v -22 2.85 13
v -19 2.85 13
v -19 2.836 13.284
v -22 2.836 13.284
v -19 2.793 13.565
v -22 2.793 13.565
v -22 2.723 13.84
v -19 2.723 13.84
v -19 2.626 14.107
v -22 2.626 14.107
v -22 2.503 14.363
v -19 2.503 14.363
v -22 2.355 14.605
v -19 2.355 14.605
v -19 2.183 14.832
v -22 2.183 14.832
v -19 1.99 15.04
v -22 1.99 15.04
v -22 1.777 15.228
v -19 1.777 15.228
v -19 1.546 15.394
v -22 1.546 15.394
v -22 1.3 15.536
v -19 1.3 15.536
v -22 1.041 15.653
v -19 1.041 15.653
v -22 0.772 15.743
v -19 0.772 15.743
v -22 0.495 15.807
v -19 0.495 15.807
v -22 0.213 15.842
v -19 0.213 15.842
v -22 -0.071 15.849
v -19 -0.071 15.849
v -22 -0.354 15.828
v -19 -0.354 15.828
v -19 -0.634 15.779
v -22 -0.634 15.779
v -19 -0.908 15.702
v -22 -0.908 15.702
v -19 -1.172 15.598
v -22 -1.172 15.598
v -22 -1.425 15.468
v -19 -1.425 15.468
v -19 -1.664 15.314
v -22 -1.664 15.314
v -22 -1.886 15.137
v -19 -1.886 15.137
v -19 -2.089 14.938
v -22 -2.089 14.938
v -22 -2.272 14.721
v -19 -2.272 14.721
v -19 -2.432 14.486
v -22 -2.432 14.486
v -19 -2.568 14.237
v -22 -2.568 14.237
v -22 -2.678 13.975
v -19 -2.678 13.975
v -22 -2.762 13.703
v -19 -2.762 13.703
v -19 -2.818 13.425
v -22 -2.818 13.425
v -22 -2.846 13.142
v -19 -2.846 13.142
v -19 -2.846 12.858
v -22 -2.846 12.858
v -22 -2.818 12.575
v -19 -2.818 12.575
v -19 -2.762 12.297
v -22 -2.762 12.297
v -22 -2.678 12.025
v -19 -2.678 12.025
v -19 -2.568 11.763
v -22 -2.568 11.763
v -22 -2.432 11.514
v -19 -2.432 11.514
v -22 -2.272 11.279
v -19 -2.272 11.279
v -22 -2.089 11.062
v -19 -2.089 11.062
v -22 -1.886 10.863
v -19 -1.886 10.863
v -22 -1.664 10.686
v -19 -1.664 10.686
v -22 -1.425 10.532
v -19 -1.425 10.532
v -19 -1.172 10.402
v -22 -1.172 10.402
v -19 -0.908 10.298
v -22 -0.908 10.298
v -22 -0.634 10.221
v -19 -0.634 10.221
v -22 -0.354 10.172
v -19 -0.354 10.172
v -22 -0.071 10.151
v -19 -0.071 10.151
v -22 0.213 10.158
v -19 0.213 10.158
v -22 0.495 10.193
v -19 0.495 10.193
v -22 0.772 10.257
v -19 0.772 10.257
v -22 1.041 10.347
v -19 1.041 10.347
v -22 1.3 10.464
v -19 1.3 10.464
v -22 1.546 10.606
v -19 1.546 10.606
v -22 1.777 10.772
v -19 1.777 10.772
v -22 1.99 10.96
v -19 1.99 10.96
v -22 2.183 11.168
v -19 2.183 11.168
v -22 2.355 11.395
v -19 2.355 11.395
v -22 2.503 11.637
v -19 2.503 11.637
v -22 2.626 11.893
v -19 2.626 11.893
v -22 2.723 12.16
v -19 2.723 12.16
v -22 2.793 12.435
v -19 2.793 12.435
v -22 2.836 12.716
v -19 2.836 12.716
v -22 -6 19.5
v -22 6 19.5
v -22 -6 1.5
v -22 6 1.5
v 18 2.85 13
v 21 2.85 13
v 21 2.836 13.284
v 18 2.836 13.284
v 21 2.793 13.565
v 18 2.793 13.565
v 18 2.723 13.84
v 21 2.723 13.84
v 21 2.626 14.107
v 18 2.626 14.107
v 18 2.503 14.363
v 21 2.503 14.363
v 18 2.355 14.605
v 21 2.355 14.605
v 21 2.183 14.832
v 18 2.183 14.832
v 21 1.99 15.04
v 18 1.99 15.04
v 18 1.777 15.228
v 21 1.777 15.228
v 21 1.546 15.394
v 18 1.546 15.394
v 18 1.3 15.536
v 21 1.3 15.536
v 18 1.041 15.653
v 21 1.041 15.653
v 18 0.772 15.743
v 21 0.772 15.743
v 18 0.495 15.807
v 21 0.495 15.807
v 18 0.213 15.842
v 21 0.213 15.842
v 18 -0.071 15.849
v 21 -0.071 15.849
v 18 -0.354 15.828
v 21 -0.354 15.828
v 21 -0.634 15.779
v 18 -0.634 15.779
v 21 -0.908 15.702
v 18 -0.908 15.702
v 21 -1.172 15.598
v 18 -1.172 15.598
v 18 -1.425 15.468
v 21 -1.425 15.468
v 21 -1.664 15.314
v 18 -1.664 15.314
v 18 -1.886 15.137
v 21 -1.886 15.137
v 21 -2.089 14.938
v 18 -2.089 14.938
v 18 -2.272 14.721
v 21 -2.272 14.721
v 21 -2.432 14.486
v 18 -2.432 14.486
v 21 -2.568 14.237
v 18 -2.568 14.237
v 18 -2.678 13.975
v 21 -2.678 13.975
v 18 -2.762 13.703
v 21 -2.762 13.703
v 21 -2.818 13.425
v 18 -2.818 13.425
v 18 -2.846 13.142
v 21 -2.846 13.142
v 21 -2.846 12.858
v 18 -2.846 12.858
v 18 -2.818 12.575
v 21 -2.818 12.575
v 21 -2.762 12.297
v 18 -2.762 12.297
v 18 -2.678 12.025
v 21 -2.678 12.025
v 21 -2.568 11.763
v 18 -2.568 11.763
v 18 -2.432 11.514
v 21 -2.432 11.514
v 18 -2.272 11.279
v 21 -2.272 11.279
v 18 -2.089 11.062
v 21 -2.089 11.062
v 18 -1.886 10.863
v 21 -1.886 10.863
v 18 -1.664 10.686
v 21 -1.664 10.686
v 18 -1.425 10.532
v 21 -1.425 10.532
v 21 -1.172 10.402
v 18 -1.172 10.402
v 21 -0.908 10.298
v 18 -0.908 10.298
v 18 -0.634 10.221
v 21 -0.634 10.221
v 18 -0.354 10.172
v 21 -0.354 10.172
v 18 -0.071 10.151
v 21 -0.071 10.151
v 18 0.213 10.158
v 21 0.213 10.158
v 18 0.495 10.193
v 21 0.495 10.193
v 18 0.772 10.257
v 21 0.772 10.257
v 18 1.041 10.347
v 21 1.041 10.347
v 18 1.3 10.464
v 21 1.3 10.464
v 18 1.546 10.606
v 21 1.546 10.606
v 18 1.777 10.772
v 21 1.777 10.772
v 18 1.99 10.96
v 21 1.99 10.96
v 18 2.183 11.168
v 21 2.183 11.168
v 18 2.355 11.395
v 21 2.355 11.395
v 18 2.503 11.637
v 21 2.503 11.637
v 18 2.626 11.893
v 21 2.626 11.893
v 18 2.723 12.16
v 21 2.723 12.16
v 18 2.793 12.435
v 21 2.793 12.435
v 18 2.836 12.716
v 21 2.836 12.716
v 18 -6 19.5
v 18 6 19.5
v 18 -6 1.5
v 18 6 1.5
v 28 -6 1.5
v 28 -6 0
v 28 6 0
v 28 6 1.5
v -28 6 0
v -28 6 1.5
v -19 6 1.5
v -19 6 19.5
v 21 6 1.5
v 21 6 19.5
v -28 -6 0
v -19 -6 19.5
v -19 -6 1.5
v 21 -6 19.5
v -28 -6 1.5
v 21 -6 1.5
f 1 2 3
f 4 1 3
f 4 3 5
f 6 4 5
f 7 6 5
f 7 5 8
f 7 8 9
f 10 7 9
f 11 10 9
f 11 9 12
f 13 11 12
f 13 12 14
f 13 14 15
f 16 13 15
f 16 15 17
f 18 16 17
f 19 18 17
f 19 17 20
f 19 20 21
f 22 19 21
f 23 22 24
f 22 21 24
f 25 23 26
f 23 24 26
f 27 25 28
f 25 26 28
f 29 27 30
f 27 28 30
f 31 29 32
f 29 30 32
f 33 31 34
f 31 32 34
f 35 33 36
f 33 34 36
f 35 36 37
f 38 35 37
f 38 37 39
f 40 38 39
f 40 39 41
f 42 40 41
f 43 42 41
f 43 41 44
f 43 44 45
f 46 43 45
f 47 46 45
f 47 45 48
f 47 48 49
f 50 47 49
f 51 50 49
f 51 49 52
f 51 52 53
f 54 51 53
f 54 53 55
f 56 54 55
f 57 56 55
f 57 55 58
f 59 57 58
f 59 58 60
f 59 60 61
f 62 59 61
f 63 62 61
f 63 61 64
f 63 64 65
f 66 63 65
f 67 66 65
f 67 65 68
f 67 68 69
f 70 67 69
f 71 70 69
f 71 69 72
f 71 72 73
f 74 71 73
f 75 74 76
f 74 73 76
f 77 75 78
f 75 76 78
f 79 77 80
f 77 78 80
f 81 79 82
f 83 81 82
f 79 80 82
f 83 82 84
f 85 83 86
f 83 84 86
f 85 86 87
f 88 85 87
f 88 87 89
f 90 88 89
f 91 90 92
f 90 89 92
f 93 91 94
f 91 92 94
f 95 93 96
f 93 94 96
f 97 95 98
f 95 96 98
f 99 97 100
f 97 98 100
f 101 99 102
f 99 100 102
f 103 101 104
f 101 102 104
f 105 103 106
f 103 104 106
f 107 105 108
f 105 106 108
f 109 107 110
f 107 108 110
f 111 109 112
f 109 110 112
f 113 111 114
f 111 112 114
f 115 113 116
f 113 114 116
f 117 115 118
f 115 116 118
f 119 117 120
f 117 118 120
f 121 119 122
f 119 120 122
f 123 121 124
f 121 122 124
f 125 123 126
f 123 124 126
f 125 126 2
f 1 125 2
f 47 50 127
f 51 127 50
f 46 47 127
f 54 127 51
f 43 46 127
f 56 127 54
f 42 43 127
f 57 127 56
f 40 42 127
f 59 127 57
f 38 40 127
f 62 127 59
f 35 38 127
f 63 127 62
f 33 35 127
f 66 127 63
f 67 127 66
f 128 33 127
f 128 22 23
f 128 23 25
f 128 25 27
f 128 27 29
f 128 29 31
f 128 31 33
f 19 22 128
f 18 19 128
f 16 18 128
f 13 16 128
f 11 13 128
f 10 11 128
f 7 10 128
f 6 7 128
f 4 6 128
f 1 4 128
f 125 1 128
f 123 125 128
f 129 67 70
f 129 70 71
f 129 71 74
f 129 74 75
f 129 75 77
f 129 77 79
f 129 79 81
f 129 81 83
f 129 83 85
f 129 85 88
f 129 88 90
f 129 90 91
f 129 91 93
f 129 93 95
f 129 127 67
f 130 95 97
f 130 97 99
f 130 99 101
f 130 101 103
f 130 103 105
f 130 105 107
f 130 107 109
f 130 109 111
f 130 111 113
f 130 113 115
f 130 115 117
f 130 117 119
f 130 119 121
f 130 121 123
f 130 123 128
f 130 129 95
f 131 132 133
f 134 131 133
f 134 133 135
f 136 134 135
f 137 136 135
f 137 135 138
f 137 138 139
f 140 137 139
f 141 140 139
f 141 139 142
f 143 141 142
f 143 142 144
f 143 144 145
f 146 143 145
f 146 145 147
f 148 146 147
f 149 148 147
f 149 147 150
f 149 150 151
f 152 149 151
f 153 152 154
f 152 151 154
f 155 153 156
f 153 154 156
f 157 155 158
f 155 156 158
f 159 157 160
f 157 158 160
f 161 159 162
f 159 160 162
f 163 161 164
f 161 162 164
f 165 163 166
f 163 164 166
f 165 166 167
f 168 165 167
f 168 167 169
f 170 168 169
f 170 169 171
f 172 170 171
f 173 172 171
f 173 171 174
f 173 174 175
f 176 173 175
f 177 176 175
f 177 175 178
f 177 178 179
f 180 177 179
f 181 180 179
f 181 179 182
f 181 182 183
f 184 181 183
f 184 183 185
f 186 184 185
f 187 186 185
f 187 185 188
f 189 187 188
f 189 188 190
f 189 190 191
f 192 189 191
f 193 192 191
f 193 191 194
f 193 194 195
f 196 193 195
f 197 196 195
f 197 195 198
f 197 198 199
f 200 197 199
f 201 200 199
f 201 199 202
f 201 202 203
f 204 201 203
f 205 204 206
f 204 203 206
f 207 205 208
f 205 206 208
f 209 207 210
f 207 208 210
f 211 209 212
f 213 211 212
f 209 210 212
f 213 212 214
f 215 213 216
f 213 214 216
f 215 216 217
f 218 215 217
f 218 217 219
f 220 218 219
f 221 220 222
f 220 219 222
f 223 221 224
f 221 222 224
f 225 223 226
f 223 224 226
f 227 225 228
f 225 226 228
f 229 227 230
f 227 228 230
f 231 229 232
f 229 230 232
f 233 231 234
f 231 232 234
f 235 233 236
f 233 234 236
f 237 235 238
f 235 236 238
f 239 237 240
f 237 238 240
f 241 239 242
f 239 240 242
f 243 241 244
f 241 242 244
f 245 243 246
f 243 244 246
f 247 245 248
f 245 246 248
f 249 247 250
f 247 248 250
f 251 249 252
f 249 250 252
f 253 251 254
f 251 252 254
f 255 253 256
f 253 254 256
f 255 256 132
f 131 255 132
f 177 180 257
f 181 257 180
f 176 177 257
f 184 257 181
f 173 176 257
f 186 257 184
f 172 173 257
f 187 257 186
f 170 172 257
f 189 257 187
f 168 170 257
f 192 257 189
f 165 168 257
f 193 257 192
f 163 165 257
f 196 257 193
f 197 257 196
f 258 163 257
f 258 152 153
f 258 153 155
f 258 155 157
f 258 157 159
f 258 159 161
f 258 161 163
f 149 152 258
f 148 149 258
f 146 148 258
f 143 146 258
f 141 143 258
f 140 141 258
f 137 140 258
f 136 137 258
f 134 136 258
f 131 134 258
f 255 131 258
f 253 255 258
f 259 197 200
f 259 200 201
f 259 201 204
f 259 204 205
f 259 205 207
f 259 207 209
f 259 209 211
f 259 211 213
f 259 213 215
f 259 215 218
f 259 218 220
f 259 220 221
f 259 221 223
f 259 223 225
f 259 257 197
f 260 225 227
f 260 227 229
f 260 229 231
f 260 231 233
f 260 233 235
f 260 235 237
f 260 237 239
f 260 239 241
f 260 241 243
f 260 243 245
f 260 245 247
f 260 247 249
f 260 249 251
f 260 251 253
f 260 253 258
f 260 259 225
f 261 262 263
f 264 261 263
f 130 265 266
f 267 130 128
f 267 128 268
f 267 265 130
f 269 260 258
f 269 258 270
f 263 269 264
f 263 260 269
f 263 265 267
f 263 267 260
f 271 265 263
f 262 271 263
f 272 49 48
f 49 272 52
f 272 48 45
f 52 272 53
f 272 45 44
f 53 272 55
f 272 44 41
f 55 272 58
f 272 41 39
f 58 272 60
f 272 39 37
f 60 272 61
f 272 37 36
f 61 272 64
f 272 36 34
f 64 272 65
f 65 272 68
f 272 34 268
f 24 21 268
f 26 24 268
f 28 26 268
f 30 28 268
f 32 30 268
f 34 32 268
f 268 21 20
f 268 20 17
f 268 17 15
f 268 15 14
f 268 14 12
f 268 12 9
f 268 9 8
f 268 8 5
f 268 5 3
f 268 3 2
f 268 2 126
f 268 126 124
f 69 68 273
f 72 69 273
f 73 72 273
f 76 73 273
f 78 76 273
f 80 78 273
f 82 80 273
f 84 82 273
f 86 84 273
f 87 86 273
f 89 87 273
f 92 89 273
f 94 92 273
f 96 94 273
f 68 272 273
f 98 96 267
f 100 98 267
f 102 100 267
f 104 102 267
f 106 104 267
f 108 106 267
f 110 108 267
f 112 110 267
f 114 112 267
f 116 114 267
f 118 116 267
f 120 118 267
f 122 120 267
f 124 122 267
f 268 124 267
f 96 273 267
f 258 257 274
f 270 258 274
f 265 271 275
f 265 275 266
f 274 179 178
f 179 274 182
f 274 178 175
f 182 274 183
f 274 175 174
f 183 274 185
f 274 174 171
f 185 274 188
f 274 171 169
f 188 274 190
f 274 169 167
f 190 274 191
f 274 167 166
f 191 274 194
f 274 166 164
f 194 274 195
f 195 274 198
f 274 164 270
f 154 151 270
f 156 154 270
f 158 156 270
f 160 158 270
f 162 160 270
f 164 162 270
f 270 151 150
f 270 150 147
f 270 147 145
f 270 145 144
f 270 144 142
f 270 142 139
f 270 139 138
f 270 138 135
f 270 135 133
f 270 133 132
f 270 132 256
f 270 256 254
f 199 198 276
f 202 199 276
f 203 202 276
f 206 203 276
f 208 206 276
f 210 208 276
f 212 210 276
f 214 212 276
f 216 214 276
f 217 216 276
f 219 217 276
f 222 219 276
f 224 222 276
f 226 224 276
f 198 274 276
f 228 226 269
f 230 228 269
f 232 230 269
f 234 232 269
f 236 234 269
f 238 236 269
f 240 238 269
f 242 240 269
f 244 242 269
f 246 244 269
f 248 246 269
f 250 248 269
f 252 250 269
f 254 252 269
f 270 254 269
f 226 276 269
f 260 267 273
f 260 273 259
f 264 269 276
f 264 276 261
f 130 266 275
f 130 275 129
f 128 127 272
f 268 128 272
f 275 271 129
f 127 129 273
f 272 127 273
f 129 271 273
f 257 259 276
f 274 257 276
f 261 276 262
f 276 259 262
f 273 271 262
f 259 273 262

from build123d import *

# Parameters (mm, degrees)
SKETCH_2_W          = 56
SKETCH_2_H          = 12
EXTRUDE_1_DEPTH     = 1.5
SKETCH_3_W          = 3
SKETCH_3_H          = 12
EXTRUDE_2_DEPTH     = 18
SKETCH_4_R          = 2.85
CUT_EXTRUDE_1_DEPTH = 54.077773126


with BuildPart() as part:
    # 草图2 → 凸台-拉伸1 (new body)
    with BuildSketch(Plane.XY):
        Rectangle(SKETCH_2_W, SKETCH_2_H)
    extrude(amount=EXTRUDE_1_DEPTH)

    # 草图3 → 凸台-拉伸2 (add)
    with BuildSketch(Plane.XY.offset(1.5)):
        with Locations((-20.5, 0)):
            Rectangle(SKETCH_3_W, SKETCH_3_H)
        with Locations((19.5, 0)):
            Rectangle(SKETCH_3_W, SKETCH_3_H)
    extrude(amount=EXTRUDE_2_DEPTH)

    # 草图4 → 切除-拉伸1 (cut, through all)
    with BuildSketch(Plane(origin=(21, 0, 0), x_dir=(0, 0, -1), z_dir=(1, 0, 0))):
        with Locations(Location((-13, 0, 0), (0, 0, 90))):
            Circle(SKETCH_4_R)
    extrude(amount=-CUT_EXTRUDE_1_DEPTH, mode=Mode.SUBTRACT)


solid = part.part
